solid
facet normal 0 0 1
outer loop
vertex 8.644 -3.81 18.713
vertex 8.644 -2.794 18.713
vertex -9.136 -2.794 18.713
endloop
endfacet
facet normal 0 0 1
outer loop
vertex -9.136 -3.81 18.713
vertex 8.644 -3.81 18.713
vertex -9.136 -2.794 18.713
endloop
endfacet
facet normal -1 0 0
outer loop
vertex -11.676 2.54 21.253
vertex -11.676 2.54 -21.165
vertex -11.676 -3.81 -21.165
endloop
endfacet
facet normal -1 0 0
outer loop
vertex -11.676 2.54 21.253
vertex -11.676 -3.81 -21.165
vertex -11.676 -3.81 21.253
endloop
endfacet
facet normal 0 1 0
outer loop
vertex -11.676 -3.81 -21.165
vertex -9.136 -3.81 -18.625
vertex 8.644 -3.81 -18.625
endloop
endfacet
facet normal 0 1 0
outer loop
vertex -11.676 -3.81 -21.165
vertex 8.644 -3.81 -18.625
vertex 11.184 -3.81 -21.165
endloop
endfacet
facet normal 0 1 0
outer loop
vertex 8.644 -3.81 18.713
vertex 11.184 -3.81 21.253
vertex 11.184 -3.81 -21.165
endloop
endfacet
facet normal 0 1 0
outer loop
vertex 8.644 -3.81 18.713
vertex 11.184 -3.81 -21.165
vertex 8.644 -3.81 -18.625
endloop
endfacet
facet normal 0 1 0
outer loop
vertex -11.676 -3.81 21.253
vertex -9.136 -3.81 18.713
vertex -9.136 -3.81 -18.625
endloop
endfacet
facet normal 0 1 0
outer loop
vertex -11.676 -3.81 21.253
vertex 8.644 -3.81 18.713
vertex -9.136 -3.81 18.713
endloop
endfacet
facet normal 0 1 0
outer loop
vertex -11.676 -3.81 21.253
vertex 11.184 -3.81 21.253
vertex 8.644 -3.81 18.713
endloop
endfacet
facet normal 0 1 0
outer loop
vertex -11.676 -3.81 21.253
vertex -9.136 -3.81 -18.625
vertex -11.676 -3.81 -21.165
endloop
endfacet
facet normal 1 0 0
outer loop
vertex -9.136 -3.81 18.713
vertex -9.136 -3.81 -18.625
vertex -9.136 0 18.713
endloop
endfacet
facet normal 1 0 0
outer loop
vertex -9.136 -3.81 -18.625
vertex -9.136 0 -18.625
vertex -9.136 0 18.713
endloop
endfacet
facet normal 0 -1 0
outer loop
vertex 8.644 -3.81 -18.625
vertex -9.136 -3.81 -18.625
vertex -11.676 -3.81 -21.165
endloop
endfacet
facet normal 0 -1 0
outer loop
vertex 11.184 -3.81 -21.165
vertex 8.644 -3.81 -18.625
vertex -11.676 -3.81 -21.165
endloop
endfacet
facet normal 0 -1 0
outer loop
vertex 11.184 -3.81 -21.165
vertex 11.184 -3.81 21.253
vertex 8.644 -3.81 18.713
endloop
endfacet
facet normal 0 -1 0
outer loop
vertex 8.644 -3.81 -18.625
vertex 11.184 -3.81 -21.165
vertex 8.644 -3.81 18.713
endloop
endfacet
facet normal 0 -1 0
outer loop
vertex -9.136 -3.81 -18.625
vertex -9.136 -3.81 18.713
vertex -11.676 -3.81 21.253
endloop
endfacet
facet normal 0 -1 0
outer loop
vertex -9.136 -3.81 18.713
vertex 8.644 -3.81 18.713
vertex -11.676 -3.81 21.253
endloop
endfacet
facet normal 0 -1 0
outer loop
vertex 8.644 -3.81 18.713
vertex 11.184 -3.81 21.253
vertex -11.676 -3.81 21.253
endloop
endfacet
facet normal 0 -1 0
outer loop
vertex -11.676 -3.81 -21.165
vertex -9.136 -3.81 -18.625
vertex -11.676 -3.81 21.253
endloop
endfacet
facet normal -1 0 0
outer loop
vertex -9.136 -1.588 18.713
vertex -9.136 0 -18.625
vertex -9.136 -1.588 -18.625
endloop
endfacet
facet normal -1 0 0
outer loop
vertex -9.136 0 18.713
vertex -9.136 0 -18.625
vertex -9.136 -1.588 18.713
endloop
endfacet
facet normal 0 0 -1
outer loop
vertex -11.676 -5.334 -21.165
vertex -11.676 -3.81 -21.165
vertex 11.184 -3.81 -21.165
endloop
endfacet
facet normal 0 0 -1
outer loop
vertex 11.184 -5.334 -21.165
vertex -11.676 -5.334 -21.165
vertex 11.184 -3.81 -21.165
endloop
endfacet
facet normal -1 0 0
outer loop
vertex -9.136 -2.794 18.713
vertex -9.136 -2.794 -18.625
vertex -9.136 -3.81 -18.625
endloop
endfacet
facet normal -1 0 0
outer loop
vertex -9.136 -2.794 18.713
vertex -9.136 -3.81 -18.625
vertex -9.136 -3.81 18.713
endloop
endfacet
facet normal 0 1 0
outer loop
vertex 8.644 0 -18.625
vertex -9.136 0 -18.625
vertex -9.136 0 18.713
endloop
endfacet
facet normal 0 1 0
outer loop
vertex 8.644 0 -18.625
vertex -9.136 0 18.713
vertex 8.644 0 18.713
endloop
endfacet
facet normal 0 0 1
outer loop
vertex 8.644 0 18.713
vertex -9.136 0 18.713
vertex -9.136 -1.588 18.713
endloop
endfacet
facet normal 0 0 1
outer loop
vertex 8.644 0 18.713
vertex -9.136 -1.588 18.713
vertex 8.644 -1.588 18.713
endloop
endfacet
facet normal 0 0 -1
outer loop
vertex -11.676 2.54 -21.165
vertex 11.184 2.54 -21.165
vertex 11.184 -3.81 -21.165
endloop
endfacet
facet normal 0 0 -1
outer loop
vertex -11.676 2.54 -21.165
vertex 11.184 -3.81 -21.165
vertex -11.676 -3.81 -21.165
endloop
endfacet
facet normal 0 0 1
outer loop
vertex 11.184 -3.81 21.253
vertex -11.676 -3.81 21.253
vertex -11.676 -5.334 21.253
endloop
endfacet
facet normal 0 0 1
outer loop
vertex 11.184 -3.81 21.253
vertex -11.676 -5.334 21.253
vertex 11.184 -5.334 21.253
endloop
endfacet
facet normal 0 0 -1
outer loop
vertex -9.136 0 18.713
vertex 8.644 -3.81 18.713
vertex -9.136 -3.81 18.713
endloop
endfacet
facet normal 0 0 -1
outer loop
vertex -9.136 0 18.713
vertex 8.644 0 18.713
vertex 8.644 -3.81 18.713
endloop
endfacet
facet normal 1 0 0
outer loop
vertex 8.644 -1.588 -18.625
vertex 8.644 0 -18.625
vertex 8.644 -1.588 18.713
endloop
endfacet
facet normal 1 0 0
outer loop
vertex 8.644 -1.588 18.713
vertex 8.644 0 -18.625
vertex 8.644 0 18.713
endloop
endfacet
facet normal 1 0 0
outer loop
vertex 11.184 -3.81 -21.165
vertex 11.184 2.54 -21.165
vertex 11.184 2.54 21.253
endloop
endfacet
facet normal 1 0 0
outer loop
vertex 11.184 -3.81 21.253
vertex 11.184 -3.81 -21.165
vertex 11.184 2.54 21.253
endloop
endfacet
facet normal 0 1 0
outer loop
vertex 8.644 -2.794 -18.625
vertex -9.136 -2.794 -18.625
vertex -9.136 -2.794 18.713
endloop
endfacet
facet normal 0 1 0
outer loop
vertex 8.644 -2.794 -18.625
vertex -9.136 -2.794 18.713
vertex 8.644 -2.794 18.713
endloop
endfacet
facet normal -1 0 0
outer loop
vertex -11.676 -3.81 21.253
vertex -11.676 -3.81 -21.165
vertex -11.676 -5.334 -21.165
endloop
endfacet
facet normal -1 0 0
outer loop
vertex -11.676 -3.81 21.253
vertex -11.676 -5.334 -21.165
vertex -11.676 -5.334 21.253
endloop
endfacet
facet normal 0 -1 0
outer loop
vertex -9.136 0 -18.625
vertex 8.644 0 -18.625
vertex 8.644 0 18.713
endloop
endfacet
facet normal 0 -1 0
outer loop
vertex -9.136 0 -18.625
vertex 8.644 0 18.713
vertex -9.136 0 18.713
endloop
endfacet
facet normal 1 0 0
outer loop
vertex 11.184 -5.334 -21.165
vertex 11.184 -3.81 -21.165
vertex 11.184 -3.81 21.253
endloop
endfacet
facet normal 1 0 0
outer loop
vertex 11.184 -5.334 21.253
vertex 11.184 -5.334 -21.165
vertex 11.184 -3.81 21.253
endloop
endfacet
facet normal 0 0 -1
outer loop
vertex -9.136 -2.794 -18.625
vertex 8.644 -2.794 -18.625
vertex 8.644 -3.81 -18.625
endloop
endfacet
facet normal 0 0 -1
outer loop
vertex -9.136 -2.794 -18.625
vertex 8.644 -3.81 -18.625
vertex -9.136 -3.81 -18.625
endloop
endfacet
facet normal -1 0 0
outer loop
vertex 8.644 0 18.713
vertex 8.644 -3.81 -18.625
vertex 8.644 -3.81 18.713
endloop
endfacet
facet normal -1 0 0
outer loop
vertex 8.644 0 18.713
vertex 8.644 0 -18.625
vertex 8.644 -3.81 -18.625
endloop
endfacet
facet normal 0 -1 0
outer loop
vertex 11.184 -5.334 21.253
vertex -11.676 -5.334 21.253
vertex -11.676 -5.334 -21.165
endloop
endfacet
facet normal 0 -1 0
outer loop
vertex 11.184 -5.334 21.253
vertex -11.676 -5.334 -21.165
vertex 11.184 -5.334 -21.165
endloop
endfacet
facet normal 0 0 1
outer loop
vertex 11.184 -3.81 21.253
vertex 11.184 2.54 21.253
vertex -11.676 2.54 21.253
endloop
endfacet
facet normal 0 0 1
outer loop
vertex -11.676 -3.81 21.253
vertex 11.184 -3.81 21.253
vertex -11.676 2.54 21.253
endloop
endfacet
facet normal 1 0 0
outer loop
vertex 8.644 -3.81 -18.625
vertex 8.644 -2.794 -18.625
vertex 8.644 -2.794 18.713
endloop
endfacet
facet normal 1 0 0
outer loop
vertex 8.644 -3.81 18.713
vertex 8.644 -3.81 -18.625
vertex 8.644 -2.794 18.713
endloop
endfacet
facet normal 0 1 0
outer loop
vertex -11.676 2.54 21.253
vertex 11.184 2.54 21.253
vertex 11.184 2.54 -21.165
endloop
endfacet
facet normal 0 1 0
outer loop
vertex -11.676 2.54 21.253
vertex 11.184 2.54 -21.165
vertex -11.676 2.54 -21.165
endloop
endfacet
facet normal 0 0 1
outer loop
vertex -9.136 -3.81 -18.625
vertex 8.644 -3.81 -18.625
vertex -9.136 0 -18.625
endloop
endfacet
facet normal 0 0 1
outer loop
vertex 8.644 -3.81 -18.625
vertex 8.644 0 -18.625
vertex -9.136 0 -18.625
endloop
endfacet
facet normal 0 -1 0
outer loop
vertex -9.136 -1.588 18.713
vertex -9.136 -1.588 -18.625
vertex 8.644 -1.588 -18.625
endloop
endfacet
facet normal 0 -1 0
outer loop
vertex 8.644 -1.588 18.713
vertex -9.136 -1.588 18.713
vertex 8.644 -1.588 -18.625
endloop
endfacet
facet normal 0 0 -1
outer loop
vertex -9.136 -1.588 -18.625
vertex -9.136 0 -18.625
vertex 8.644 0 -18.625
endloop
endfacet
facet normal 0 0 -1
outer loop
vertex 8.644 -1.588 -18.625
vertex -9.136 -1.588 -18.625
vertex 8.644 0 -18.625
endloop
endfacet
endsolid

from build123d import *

# Parameters (mm, degrees)
F0_W     = 17.78
F0_H     = 37.338
F1_DEPTH = 1.5875
F3_W     = 22.86
F3_H     = 42.418
F4_DEPTH = 6.35
F5_T     = -2.54
F7_W     = 22.86
F7_H     = 42.418
F8_DEPTH = 2.54


with BuildPart() as f1:
    # F0 (on Front) → F1 (new body)
    with BuildSketch(Plane.XZ):
        with Locations((-0.2455806217, 0.0442041901)):
            Rectangle(F0_W, F0_H)
    extrude(amount=F1_DEPTH)


with BuildPart() as f4:
    # F3 (on offset) → F4 (new body)
    with BuildSketch(Plane(origin=(0, 2.54, 0), x_dir=(-1, 0, 0), z_dir=(0, 1, 0))):
        with Locations((0.2455806217, 0.0442041901)):
            Rectangle(F3_W, F3_H)
    extrude(amount=-F4_DEPTH)

    # F5
    f5_openings = [f4.faces().sort_by_distance(p)[0] for p in [
        (-0.245581, -3.81, 0.044204),
    ]]
    offset(amount=F5_T, openings=f5_openings)


with BuildPart() as f8:
    # F7 (on offset) → F8 (new body)
    with BuildSketch(Plane.XZ.offset(2.794)):
        with Locations((-0.2455806217, 0.0442041901)):
            Rectangle(F7_W, F7_H)
    extrude(amount=F8_DEPTH)

    # F9: cut F4
    add(f4.part, mode=Mode.SUBTRACT)


solid = Compound([f1.part, f4.part, f8.part])
